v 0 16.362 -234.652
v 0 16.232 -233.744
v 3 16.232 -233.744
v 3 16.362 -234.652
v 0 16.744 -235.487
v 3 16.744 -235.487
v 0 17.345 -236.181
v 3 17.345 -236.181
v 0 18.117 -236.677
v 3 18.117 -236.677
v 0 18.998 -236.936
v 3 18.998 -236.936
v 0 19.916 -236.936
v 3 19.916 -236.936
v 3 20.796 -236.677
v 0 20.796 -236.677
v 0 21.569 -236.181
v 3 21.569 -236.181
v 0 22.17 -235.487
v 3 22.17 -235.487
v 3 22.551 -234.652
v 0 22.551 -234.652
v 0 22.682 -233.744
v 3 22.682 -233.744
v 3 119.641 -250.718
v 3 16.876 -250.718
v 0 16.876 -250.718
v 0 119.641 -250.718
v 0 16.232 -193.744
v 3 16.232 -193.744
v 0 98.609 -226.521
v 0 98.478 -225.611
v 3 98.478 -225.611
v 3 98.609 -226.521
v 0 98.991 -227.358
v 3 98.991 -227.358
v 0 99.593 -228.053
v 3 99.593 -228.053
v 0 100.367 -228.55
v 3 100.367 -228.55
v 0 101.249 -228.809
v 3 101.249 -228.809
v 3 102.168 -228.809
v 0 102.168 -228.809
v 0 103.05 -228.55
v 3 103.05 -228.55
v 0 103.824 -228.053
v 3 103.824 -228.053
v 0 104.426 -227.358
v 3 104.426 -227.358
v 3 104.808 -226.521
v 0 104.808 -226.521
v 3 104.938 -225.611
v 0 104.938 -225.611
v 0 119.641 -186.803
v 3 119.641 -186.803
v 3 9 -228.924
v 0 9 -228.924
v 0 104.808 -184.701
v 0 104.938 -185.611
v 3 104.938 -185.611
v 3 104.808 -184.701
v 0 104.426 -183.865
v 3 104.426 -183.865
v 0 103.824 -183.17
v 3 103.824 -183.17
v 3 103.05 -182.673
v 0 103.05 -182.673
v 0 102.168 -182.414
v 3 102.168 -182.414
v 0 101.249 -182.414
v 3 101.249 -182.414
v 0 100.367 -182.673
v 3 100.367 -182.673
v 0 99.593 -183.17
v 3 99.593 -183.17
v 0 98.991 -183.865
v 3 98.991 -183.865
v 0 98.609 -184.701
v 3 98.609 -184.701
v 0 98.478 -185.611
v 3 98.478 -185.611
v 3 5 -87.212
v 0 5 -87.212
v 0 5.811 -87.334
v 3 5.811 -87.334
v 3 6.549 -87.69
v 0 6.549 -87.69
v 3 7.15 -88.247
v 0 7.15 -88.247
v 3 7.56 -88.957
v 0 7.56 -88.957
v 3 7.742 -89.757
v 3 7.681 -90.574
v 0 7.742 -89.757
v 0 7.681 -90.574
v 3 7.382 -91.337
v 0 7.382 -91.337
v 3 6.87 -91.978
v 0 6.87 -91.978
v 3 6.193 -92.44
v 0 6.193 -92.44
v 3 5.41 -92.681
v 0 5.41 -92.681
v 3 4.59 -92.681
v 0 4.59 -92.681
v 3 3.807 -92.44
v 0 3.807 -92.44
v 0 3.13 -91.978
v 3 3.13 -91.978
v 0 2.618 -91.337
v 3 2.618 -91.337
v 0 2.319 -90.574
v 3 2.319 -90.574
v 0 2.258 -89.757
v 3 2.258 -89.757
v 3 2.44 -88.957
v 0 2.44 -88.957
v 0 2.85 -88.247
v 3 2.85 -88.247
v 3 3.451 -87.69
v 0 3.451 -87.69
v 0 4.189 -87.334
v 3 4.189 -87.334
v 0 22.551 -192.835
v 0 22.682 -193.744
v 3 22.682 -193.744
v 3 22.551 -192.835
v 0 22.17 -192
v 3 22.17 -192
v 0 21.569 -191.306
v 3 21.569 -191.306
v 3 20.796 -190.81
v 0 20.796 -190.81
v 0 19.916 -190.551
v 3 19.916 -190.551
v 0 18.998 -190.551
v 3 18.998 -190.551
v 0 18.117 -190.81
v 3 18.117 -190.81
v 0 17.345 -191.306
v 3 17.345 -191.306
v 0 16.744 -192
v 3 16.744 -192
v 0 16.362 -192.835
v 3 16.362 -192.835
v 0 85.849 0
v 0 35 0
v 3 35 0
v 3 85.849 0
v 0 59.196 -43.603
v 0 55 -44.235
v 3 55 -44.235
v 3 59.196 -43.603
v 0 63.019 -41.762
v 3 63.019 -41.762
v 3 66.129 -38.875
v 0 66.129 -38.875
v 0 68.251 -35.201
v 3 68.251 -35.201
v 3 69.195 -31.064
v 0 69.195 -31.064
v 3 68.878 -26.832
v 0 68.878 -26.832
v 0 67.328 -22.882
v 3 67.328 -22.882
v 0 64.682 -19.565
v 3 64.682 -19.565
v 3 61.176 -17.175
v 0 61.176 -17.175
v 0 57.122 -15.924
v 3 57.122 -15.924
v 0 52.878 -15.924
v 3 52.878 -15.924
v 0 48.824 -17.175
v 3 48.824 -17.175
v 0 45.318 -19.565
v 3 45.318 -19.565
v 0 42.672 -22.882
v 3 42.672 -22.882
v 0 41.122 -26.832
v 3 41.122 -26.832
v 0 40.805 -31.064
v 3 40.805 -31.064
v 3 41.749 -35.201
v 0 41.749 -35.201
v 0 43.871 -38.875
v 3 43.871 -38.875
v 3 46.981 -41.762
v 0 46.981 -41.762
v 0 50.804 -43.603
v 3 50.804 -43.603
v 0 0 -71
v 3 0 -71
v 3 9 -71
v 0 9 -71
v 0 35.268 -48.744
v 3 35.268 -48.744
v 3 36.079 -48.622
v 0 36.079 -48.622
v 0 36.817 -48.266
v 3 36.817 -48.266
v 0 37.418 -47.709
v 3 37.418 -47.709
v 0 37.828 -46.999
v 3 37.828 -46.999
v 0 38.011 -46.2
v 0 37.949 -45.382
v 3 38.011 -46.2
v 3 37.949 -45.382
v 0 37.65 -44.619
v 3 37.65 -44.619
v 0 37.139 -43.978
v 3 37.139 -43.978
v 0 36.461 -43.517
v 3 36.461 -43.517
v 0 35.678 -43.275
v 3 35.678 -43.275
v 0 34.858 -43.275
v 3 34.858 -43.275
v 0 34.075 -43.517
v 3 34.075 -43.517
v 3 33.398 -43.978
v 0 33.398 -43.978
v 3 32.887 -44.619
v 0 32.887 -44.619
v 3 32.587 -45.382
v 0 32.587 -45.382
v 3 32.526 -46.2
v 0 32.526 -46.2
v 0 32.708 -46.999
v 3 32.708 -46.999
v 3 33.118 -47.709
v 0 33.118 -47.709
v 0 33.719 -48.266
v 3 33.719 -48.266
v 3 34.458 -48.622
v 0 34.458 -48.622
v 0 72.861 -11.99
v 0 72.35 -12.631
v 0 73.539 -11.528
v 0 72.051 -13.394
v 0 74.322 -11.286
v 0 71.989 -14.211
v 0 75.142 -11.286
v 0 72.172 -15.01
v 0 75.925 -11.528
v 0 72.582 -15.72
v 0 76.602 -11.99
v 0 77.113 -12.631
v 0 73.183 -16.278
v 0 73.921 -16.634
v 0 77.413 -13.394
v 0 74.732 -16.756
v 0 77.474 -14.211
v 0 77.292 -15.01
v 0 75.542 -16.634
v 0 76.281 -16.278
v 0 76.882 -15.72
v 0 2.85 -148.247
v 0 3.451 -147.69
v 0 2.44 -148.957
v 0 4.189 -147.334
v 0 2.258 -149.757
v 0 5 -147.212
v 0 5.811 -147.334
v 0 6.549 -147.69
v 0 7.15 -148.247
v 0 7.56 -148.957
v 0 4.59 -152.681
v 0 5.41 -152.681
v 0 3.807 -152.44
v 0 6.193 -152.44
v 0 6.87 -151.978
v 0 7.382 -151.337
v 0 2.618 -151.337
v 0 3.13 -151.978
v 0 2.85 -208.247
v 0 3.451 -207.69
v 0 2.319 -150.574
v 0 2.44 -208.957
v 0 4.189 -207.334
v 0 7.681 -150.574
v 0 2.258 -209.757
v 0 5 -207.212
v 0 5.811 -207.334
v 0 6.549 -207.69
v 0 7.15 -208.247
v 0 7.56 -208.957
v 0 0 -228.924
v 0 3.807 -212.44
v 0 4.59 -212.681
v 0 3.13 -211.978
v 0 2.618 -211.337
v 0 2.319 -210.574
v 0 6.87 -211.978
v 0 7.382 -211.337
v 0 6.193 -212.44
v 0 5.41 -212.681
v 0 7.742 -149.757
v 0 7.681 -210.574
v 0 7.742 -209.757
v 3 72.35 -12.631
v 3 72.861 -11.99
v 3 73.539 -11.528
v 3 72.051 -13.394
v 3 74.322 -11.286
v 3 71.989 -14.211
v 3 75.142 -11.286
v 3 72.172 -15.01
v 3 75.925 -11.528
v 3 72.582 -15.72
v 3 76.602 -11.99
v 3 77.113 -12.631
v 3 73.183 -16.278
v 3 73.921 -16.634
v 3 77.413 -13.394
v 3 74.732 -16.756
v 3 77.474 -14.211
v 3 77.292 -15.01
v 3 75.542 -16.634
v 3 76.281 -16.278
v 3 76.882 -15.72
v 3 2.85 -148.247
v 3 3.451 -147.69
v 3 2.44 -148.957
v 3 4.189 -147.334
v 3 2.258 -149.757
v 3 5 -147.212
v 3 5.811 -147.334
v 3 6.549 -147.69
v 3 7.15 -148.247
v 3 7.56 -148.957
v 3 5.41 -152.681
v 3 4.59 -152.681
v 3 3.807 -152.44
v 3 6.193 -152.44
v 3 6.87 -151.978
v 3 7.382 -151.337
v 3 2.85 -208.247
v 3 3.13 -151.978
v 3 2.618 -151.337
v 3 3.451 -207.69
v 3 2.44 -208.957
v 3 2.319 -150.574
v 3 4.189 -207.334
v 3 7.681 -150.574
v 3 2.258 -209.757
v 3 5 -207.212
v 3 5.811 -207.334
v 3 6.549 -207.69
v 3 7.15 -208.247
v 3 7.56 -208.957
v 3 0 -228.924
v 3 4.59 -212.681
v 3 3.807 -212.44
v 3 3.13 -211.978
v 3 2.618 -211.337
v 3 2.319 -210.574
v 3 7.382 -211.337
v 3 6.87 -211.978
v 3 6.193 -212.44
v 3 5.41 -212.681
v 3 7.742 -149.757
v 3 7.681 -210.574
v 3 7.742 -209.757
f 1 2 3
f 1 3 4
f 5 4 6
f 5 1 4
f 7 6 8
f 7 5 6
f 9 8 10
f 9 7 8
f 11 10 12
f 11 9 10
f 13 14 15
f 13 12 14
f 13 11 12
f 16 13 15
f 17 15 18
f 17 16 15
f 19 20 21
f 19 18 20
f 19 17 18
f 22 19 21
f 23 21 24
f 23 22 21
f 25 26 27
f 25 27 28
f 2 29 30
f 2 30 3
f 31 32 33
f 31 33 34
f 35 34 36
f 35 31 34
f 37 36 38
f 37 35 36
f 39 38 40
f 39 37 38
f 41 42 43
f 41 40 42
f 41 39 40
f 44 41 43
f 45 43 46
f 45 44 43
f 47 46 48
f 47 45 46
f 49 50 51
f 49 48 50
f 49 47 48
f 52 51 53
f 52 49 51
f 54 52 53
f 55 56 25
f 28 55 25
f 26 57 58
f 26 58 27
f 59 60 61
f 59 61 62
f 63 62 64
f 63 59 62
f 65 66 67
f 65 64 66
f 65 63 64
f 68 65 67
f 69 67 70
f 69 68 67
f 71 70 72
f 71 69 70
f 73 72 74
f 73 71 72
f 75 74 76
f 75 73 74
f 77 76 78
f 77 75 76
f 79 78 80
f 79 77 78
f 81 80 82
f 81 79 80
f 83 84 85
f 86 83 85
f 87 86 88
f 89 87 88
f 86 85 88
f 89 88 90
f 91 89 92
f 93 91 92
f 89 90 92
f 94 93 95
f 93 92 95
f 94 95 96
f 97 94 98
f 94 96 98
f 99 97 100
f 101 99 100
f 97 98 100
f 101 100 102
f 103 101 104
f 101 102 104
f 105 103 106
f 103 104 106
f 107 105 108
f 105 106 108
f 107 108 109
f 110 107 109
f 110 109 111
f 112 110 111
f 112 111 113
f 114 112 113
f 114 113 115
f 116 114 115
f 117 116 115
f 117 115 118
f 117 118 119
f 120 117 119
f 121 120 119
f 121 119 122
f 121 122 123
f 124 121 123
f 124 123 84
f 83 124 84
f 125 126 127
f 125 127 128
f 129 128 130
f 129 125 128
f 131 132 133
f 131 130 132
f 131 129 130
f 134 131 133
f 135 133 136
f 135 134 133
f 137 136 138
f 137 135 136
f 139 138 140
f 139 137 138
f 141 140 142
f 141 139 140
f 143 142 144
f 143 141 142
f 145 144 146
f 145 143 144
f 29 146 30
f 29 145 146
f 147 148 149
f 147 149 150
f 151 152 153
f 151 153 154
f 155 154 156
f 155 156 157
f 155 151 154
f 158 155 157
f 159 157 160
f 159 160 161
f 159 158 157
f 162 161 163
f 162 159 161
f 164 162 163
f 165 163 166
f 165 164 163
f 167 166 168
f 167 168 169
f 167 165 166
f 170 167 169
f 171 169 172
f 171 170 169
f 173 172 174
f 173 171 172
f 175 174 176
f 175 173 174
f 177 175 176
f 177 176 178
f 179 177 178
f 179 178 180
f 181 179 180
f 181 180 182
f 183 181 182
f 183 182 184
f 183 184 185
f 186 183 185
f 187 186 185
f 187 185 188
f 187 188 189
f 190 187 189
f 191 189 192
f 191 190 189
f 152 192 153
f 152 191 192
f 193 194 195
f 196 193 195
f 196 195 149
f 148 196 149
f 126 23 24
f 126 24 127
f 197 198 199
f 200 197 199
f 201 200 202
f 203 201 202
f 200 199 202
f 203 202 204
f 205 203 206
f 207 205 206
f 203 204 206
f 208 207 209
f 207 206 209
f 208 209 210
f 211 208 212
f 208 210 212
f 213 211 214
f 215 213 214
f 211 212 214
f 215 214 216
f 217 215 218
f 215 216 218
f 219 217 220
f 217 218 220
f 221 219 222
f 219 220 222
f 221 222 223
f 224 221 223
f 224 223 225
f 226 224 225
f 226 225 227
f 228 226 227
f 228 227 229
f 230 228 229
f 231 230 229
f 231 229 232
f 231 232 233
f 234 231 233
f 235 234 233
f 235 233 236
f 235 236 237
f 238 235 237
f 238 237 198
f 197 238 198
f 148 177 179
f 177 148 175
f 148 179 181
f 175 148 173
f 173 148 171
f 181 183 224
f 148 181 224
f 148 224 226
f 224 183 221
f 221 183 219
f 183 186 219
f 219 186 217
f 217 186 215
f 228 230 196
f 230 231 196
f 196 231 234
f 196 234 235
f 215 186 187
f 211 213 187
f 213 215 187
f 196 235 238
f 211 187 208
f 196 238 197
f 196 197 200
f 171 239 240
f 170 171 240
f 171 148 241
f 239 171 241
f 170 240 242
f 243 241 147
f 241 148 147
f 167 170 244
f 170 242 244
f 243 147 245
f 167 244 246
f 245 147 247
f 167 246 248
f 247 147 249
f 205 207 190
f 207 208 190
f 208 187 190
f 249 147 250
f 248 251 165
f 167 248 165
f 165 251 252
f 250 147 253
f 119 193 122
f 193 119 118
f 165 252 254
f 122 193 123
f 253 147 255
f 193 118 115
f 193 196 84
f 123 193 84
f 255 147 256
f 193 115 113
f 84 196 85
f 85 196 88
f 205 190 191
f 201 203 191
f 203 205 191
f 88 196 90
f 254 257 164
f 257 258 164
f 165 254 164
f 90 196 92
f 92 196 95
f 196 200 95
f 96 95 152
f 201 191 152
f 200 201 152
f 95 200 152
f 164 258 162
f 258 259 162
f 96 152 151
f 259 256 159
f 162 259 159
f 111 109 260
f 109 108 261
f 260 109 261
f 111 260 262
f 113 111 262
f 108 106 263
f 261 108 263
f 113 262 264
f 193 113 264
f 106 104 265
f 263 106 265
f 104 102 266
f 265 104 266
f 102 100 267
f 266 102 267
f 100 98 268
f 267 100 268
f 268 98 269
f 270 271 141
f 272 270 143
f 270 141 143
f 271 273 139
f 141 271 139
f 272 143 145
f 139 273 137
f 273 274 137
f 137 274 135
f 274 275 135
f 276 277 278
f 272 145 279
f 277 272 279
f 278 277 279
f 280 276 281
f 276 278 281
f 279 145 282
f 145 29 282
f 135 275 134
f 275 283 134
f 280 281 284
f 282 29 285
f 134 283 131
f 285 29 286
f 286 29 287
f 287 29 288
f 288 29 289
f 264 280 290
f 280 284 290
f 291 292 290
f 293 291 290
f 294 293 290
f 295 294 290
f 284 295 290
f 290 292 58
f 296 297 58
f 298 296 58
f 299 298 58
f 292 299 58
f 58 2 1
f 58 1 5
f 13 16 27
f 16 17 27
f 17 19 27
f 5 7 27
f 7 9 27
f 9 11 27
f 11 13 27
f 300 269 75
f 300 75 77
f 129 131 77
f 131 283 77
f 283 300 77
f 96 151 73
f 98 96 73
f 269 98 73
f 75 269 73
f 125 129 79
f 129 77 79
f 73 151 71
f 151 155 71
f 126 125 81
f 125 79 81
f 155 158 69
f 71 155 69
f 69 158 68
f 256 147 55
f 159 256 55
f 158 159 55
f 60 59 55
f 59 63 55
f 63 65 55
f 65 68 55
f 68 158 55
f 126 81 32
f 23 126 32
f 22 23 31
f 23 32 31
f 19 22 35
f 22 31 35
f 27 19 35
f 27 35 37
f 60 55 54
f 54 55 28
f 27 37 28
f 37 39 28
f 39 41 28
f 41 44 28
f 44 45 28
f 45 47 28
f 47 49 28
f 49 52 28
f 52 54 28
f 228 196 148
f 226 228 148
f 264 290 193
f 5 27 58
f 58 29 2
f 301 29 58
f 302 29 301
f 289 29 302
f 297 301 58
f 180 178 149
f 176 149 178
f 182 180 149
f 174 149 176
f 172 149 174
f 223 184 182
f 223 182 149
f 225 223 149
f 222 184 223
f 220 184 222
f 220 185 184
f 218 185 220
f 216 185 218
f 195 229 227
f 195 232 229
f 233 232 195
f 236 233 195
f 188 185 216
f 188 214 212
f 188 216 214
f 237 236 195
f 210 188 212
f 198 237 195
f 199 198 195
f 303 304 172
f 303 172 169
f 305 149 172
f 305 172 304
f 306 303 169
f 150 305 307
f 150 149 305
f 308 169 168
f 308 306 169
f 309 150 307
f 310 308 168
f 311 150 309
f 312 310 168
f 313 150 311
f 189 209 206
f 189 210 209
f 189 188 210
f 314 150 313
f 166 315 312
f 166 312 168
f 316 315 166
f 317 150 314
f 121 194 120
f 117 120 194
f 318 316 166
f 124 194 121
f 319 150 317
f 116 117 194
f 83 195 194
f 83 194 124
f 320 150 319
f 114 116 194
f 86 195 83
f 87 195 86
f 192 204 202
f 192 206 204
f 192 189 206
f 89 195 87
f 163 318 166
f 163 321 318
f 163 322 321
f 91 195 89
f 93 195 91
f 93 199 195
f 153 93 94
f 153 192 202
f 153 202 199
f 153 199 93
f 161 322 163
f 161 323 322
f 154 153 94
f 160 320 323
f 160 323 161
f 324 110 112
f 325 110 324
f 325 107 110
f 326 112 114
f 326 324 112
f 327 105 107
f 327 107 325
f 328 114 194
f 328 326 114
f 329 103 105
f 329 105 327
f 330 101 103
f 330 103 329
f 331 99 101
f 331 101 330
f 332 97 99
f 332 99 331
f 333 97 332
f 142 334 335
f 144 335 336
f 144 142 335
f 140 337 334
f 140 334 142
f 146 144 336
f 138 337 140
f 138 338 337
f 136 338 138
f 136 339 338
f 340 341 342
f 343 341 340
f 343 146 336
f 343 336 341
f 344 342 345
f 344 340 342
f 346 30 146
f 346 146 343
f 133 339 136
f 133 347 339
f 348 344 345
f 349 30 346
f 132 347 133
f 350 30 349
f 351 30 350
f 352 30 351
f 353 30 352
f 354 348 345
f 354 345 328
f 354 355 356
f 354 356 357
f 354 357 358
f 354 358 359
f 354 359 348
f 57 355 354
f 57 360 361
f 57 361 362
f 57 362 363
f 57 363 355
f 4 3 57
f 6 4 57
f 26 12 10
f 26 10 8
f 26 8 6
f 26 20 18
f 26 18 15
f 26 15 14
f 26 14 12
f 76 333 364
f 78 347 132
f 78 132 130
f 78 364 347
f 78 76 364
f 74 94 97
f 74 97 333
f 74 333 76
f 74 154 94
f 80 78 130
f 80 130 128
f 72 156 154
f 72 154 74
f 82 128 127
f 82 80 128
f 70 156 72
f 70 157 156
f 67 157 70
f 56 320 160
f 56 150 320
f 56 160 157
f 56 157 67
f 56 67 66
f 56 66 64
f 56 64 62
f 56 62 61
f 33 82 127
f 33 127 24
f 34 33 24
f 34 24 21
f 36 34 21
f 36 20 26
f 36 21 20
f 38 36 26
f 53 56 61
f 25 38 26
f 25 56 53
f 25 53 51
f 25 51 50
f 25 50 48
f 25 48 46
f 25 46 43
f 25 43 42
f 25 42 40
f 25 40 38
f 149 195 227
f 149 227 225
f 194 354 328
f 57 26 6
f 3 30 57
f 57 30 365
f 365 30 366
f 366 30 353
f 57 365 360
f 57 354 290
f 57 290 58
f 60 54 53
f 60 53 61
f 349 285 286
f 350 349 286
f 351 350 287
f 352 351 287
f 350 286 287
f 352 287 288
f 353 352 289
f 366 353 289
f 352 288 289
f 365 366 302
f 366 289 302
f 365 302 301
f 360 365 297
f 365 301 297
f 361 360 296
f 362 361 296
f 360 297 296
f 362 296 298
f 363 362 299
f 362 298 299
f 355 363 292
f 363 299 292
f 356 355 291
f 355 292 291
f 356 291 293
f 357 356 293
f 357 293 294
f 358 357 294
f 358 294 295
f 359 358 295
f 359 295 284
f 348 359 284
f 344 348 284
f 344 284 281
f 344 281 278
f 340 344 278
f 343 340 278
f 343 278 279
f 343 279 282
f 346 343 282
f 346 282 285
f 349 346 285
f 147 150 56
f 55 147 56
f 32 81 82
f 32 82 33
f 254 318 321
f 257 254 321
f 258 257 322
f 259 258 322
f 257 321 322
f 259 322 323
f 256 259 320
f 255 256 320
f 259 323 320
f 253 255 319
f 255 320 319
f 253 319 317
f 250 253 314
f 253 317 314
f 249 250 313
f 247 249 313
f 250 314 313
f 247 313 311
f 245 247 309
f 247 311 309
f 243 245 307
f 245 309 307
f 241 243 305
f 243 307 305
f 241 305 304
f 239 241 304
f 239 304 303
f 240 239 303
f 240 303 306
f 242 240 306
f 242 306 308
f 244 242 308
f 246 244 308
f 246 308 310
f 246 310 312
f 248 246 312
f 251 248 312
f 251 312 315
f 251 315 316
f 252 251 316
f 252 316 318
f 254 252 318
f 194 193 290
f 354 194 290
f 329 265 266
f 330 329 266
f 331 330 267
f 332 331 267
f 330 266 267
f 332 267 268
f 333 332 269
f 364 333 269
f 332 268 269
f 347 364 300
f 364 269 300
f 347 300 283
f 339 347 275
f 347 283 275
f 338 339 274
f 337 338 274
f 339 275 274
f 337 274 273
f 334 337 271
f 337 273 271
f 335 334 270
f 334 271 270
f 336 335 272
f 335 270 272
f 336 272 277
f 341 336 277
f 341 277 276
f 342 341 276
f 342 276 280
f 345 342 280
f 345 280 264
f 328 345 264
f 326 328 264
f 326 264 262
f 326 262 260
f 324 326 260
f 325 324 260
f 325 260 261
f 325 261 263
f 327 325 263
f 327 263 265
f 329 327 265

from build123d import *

# Parameters (mm, degrees)
SKETCH1_W           = 300
SKETCH1_H           = 150
SKETCH1_R           = 14.235
BOSS_EXTRUDE1_DEPTH = 3
CUT_EXTRUDE1_REACH  = 5
SKETCH2_R           = 3.225
SKETCH3_R           = 2.75
CUT_EXTRUDE2_DEPTH  = 4
CUT_EXTRUDE3_DEPTH  = 4
CUT_EXTRUDE4_DEPTH  = 10
CUT_EXTRUDE5_DEPTH  = 10
SKETCH7_R           = 2.75
CUT_EXTRUDE6_DEPTH  = 4


with BuildPart() as part:
    # Sketch1 → Boss-Extrude1 (new body)
    with BuildSketch(Plane(origin=(0, 0, 0), x_dir=(0, 0, -1), z_dir=(1, 0, 0))):
        with Locations((150, 75)):
            Rectangle(SKETCH1_W, SKETCH1_H)
        with Locations((30, 55)):
            Circle(SKETCH1_R, mode=Mode.SUBTRACT)
    extrude(amount=BOSS_EXTRUDE1_DEPTH)

    # Sketch2 → Cut-Extrude1 (cut, up to next)
    with BuildSketch(Plane.ZY, mode=Mode.PRIVATE) as cut_extrude1_sk1:
        with Locations((-290, 140)):
            Circle(SKETCH2_R)
    cut_extrude1_tool1 = extrude(cut_extrude1_sk1.sketch, amount=-CUT_EXTRUDE1_REACH, mode=Mode.PRIVATE) & part.part
    add(cut_extrude1_tool1.solids().sort_by_distance((0, 140, -290))[0], mode=Mode.SUBTRACT)
    # Sketch2 → Cut-Extrude1 (cut, up to next)
    with BuildSketch(Plane.ZY, mode=Mode.PRIVATE) as cut_extrude1_sk2:
        with Locations((-10, 110)):
            Circle(SKETCH2_R)
    cut_extrude1_tool2 = extrude(cut_extrude1_sk2.sketch, amount=-CUT_EXTRUDE1_REACH, mode=Mode.PRIVATE) & part.part
    add(cut_extrude1_tool2.solids().sort_by_distance((0, 110, -10))[0], mode=Mode.SUBTRACT)
    # Sketch2 → Cut-Extrude1 (cut, up to next)
    with BuildSketch(Plane.ZY, mode=Mode.PRIVATE) as cut_extrude1_sk3:
        with Locations((-290, 30)):
            Circle(SKETCH2_R)
    cut_extrude1_tool3 = extrude(cut_extrude1_sk3.sketch, amount=-CUT_EXTRUDE1_REACH, mode=Mode.PRIVATE) & part.part
    add(cut_extrude1_tool3.solids().sort_by_distance((0, 30, -290))[0], mode=Mode.SUBTRACT)
    # Sketch2 → Cut-Extrude1 (cut, up to next)
    with BuildSketch(Plane.ZY, mode=Mode.PRIVATE) as cut_extrude1_sk4:
        with BuildLine():
            Line((-185.611446384, 98.478413591), (-225.611446384, 98.478413591))
            ThreePointArc((-225.611446384, 98.478413591), (-228.841446384, 101.708413591), (-225.611446384, 104.938413591))
            Line((-225.611446384, 104.938413591), (-185.611446384, 104.938413591))
            ThreePointArc((-185.611446384, 104.938413591), (-182.381446384, 101.708413591), (-185.611446384, 98.478413591))
        make_face()
    cut_extrude1_tool4 = extrude(cut_extrude1_sk4.sketch, amount=-CUT_EXTRUDE1_REACH, mode=Mode.PRIVATE) & part.part
    add(cut_extrude1_tool4.solids().sort_by_distance((0, 101.708414, -205.611446))[0], mode=Mode.SUBTRACT)
    # Sketch2 → Cut-Extrude1 (cut, up to next)
    with BuildSketch(Plane.ZY, mode=Mode.PRIVATE) as cut_extrude1_sk5:
        with BuildLine():
            Line((-233.743605698, 22.681694356), (-193.743605698, 22.681694356))
            ThreePointArc((-193.743605698, 22.681694356), (-190.518605698, 19.456694356), (-193.743605698, 16.231694356))
            Line((-193.743605698, 16.231694356), (-233.743605698, 16.231694356))
            ThreePointArc((-233.743605698, 16.231694356), (-236.968605698, 19.456694356), (-233.743605698, 22.681694356))
        make_face()
    cut_extrude1_tool5 = extrude(cut_extrude1_sk5.sketch, amount=-CUT_EXTRUDE1_REACH, mode=Mode.PRIVATE) & part.part
    add(cut_extrude1_tool5.solids().sort_by_distance((0, 19.456694, -213.743606))[0], mode=Mode.SUBTRACT)

    # Sketch3 → Cut-Extrude2 (cut, through all)
    with BuildSketch(Plane(origin=(3, 0, 0), x_dir=(0, 0, -1), z_dir=(1, 0, 0))):
        with Locations((14.005743185, 74.73179538)):
            Circle(SKETCH3_R)
        with Locations((45.994256815, 35.26820462)):
            Circle(SKETCH3_R)
    extrude(amount=-CUT_EXTRUDE2_DEPTH, mode=Mode.SUBTRACT)

    # Sketch4 → Cut-Extrude3 (cut, through all)
    with BuildSketch(Plane(origin=(3, 0, 0), x_dir=(0, 0, -1), z_dir=(1, 0, 0))):
        Polygon((71, 9), (0, 35), (0, 0), (71, 0), align=None)
    extrude(amount=-CUT_EXTRUDE3_DEPTH, mode=Mode.SUBTRACT)

    # Sketch5 → Cut-Extrude4 (cut)
    with BuildSketch(Plane(origin=(3, 0, 0), x_dir=(0, 0, -1), z_dir=(1, 0, 0))):
        Polygon((228.92403237, 9), (250.717958721, 16.875947155), (250.717958721, 150), (312.660420977, 150), (312.660420977, -2.829604392), (228.92403237, 0), align=None)
    extrude(amount=-CUT_EXTRUDE4_DEPTH, mode=Mode.SUBTRACT)

    # Sketch6 → Cut-Extrude5 (cut)
    with BuildSketch(Plane(origin=(3, 0, 0), x_dir=(0, 0, -1), z_dir=(1, 0, 0))):
        Polygon((0, 85.848631797), (186.802640374, 119.641480316), (250.717958721, 119.641480316), (250.717958721, 150), (0, 150), align=None)
    extrude(amount=-CUT_EXTRUDE5_DEPTH, mode=Mode.SUBTRACT)

    # Sketch7 → Cut-Extrude6 (cut, through all)
    with BuildSketch(Plane.ZY):
        with Locations((-209.962016185, 5)):
            Circle(SKETCH7_R)
        with Locations((-149.962016185, 5)):
            Circle(SKETCH7_R)
        with Locations((-89.962016185, 5)):
            Circle(SKETCH7_R)
    extrude(amount=-CUT_EXTRUDE6_DEPTH, mode=Mode.SUBTRACT)


solid = part.part
